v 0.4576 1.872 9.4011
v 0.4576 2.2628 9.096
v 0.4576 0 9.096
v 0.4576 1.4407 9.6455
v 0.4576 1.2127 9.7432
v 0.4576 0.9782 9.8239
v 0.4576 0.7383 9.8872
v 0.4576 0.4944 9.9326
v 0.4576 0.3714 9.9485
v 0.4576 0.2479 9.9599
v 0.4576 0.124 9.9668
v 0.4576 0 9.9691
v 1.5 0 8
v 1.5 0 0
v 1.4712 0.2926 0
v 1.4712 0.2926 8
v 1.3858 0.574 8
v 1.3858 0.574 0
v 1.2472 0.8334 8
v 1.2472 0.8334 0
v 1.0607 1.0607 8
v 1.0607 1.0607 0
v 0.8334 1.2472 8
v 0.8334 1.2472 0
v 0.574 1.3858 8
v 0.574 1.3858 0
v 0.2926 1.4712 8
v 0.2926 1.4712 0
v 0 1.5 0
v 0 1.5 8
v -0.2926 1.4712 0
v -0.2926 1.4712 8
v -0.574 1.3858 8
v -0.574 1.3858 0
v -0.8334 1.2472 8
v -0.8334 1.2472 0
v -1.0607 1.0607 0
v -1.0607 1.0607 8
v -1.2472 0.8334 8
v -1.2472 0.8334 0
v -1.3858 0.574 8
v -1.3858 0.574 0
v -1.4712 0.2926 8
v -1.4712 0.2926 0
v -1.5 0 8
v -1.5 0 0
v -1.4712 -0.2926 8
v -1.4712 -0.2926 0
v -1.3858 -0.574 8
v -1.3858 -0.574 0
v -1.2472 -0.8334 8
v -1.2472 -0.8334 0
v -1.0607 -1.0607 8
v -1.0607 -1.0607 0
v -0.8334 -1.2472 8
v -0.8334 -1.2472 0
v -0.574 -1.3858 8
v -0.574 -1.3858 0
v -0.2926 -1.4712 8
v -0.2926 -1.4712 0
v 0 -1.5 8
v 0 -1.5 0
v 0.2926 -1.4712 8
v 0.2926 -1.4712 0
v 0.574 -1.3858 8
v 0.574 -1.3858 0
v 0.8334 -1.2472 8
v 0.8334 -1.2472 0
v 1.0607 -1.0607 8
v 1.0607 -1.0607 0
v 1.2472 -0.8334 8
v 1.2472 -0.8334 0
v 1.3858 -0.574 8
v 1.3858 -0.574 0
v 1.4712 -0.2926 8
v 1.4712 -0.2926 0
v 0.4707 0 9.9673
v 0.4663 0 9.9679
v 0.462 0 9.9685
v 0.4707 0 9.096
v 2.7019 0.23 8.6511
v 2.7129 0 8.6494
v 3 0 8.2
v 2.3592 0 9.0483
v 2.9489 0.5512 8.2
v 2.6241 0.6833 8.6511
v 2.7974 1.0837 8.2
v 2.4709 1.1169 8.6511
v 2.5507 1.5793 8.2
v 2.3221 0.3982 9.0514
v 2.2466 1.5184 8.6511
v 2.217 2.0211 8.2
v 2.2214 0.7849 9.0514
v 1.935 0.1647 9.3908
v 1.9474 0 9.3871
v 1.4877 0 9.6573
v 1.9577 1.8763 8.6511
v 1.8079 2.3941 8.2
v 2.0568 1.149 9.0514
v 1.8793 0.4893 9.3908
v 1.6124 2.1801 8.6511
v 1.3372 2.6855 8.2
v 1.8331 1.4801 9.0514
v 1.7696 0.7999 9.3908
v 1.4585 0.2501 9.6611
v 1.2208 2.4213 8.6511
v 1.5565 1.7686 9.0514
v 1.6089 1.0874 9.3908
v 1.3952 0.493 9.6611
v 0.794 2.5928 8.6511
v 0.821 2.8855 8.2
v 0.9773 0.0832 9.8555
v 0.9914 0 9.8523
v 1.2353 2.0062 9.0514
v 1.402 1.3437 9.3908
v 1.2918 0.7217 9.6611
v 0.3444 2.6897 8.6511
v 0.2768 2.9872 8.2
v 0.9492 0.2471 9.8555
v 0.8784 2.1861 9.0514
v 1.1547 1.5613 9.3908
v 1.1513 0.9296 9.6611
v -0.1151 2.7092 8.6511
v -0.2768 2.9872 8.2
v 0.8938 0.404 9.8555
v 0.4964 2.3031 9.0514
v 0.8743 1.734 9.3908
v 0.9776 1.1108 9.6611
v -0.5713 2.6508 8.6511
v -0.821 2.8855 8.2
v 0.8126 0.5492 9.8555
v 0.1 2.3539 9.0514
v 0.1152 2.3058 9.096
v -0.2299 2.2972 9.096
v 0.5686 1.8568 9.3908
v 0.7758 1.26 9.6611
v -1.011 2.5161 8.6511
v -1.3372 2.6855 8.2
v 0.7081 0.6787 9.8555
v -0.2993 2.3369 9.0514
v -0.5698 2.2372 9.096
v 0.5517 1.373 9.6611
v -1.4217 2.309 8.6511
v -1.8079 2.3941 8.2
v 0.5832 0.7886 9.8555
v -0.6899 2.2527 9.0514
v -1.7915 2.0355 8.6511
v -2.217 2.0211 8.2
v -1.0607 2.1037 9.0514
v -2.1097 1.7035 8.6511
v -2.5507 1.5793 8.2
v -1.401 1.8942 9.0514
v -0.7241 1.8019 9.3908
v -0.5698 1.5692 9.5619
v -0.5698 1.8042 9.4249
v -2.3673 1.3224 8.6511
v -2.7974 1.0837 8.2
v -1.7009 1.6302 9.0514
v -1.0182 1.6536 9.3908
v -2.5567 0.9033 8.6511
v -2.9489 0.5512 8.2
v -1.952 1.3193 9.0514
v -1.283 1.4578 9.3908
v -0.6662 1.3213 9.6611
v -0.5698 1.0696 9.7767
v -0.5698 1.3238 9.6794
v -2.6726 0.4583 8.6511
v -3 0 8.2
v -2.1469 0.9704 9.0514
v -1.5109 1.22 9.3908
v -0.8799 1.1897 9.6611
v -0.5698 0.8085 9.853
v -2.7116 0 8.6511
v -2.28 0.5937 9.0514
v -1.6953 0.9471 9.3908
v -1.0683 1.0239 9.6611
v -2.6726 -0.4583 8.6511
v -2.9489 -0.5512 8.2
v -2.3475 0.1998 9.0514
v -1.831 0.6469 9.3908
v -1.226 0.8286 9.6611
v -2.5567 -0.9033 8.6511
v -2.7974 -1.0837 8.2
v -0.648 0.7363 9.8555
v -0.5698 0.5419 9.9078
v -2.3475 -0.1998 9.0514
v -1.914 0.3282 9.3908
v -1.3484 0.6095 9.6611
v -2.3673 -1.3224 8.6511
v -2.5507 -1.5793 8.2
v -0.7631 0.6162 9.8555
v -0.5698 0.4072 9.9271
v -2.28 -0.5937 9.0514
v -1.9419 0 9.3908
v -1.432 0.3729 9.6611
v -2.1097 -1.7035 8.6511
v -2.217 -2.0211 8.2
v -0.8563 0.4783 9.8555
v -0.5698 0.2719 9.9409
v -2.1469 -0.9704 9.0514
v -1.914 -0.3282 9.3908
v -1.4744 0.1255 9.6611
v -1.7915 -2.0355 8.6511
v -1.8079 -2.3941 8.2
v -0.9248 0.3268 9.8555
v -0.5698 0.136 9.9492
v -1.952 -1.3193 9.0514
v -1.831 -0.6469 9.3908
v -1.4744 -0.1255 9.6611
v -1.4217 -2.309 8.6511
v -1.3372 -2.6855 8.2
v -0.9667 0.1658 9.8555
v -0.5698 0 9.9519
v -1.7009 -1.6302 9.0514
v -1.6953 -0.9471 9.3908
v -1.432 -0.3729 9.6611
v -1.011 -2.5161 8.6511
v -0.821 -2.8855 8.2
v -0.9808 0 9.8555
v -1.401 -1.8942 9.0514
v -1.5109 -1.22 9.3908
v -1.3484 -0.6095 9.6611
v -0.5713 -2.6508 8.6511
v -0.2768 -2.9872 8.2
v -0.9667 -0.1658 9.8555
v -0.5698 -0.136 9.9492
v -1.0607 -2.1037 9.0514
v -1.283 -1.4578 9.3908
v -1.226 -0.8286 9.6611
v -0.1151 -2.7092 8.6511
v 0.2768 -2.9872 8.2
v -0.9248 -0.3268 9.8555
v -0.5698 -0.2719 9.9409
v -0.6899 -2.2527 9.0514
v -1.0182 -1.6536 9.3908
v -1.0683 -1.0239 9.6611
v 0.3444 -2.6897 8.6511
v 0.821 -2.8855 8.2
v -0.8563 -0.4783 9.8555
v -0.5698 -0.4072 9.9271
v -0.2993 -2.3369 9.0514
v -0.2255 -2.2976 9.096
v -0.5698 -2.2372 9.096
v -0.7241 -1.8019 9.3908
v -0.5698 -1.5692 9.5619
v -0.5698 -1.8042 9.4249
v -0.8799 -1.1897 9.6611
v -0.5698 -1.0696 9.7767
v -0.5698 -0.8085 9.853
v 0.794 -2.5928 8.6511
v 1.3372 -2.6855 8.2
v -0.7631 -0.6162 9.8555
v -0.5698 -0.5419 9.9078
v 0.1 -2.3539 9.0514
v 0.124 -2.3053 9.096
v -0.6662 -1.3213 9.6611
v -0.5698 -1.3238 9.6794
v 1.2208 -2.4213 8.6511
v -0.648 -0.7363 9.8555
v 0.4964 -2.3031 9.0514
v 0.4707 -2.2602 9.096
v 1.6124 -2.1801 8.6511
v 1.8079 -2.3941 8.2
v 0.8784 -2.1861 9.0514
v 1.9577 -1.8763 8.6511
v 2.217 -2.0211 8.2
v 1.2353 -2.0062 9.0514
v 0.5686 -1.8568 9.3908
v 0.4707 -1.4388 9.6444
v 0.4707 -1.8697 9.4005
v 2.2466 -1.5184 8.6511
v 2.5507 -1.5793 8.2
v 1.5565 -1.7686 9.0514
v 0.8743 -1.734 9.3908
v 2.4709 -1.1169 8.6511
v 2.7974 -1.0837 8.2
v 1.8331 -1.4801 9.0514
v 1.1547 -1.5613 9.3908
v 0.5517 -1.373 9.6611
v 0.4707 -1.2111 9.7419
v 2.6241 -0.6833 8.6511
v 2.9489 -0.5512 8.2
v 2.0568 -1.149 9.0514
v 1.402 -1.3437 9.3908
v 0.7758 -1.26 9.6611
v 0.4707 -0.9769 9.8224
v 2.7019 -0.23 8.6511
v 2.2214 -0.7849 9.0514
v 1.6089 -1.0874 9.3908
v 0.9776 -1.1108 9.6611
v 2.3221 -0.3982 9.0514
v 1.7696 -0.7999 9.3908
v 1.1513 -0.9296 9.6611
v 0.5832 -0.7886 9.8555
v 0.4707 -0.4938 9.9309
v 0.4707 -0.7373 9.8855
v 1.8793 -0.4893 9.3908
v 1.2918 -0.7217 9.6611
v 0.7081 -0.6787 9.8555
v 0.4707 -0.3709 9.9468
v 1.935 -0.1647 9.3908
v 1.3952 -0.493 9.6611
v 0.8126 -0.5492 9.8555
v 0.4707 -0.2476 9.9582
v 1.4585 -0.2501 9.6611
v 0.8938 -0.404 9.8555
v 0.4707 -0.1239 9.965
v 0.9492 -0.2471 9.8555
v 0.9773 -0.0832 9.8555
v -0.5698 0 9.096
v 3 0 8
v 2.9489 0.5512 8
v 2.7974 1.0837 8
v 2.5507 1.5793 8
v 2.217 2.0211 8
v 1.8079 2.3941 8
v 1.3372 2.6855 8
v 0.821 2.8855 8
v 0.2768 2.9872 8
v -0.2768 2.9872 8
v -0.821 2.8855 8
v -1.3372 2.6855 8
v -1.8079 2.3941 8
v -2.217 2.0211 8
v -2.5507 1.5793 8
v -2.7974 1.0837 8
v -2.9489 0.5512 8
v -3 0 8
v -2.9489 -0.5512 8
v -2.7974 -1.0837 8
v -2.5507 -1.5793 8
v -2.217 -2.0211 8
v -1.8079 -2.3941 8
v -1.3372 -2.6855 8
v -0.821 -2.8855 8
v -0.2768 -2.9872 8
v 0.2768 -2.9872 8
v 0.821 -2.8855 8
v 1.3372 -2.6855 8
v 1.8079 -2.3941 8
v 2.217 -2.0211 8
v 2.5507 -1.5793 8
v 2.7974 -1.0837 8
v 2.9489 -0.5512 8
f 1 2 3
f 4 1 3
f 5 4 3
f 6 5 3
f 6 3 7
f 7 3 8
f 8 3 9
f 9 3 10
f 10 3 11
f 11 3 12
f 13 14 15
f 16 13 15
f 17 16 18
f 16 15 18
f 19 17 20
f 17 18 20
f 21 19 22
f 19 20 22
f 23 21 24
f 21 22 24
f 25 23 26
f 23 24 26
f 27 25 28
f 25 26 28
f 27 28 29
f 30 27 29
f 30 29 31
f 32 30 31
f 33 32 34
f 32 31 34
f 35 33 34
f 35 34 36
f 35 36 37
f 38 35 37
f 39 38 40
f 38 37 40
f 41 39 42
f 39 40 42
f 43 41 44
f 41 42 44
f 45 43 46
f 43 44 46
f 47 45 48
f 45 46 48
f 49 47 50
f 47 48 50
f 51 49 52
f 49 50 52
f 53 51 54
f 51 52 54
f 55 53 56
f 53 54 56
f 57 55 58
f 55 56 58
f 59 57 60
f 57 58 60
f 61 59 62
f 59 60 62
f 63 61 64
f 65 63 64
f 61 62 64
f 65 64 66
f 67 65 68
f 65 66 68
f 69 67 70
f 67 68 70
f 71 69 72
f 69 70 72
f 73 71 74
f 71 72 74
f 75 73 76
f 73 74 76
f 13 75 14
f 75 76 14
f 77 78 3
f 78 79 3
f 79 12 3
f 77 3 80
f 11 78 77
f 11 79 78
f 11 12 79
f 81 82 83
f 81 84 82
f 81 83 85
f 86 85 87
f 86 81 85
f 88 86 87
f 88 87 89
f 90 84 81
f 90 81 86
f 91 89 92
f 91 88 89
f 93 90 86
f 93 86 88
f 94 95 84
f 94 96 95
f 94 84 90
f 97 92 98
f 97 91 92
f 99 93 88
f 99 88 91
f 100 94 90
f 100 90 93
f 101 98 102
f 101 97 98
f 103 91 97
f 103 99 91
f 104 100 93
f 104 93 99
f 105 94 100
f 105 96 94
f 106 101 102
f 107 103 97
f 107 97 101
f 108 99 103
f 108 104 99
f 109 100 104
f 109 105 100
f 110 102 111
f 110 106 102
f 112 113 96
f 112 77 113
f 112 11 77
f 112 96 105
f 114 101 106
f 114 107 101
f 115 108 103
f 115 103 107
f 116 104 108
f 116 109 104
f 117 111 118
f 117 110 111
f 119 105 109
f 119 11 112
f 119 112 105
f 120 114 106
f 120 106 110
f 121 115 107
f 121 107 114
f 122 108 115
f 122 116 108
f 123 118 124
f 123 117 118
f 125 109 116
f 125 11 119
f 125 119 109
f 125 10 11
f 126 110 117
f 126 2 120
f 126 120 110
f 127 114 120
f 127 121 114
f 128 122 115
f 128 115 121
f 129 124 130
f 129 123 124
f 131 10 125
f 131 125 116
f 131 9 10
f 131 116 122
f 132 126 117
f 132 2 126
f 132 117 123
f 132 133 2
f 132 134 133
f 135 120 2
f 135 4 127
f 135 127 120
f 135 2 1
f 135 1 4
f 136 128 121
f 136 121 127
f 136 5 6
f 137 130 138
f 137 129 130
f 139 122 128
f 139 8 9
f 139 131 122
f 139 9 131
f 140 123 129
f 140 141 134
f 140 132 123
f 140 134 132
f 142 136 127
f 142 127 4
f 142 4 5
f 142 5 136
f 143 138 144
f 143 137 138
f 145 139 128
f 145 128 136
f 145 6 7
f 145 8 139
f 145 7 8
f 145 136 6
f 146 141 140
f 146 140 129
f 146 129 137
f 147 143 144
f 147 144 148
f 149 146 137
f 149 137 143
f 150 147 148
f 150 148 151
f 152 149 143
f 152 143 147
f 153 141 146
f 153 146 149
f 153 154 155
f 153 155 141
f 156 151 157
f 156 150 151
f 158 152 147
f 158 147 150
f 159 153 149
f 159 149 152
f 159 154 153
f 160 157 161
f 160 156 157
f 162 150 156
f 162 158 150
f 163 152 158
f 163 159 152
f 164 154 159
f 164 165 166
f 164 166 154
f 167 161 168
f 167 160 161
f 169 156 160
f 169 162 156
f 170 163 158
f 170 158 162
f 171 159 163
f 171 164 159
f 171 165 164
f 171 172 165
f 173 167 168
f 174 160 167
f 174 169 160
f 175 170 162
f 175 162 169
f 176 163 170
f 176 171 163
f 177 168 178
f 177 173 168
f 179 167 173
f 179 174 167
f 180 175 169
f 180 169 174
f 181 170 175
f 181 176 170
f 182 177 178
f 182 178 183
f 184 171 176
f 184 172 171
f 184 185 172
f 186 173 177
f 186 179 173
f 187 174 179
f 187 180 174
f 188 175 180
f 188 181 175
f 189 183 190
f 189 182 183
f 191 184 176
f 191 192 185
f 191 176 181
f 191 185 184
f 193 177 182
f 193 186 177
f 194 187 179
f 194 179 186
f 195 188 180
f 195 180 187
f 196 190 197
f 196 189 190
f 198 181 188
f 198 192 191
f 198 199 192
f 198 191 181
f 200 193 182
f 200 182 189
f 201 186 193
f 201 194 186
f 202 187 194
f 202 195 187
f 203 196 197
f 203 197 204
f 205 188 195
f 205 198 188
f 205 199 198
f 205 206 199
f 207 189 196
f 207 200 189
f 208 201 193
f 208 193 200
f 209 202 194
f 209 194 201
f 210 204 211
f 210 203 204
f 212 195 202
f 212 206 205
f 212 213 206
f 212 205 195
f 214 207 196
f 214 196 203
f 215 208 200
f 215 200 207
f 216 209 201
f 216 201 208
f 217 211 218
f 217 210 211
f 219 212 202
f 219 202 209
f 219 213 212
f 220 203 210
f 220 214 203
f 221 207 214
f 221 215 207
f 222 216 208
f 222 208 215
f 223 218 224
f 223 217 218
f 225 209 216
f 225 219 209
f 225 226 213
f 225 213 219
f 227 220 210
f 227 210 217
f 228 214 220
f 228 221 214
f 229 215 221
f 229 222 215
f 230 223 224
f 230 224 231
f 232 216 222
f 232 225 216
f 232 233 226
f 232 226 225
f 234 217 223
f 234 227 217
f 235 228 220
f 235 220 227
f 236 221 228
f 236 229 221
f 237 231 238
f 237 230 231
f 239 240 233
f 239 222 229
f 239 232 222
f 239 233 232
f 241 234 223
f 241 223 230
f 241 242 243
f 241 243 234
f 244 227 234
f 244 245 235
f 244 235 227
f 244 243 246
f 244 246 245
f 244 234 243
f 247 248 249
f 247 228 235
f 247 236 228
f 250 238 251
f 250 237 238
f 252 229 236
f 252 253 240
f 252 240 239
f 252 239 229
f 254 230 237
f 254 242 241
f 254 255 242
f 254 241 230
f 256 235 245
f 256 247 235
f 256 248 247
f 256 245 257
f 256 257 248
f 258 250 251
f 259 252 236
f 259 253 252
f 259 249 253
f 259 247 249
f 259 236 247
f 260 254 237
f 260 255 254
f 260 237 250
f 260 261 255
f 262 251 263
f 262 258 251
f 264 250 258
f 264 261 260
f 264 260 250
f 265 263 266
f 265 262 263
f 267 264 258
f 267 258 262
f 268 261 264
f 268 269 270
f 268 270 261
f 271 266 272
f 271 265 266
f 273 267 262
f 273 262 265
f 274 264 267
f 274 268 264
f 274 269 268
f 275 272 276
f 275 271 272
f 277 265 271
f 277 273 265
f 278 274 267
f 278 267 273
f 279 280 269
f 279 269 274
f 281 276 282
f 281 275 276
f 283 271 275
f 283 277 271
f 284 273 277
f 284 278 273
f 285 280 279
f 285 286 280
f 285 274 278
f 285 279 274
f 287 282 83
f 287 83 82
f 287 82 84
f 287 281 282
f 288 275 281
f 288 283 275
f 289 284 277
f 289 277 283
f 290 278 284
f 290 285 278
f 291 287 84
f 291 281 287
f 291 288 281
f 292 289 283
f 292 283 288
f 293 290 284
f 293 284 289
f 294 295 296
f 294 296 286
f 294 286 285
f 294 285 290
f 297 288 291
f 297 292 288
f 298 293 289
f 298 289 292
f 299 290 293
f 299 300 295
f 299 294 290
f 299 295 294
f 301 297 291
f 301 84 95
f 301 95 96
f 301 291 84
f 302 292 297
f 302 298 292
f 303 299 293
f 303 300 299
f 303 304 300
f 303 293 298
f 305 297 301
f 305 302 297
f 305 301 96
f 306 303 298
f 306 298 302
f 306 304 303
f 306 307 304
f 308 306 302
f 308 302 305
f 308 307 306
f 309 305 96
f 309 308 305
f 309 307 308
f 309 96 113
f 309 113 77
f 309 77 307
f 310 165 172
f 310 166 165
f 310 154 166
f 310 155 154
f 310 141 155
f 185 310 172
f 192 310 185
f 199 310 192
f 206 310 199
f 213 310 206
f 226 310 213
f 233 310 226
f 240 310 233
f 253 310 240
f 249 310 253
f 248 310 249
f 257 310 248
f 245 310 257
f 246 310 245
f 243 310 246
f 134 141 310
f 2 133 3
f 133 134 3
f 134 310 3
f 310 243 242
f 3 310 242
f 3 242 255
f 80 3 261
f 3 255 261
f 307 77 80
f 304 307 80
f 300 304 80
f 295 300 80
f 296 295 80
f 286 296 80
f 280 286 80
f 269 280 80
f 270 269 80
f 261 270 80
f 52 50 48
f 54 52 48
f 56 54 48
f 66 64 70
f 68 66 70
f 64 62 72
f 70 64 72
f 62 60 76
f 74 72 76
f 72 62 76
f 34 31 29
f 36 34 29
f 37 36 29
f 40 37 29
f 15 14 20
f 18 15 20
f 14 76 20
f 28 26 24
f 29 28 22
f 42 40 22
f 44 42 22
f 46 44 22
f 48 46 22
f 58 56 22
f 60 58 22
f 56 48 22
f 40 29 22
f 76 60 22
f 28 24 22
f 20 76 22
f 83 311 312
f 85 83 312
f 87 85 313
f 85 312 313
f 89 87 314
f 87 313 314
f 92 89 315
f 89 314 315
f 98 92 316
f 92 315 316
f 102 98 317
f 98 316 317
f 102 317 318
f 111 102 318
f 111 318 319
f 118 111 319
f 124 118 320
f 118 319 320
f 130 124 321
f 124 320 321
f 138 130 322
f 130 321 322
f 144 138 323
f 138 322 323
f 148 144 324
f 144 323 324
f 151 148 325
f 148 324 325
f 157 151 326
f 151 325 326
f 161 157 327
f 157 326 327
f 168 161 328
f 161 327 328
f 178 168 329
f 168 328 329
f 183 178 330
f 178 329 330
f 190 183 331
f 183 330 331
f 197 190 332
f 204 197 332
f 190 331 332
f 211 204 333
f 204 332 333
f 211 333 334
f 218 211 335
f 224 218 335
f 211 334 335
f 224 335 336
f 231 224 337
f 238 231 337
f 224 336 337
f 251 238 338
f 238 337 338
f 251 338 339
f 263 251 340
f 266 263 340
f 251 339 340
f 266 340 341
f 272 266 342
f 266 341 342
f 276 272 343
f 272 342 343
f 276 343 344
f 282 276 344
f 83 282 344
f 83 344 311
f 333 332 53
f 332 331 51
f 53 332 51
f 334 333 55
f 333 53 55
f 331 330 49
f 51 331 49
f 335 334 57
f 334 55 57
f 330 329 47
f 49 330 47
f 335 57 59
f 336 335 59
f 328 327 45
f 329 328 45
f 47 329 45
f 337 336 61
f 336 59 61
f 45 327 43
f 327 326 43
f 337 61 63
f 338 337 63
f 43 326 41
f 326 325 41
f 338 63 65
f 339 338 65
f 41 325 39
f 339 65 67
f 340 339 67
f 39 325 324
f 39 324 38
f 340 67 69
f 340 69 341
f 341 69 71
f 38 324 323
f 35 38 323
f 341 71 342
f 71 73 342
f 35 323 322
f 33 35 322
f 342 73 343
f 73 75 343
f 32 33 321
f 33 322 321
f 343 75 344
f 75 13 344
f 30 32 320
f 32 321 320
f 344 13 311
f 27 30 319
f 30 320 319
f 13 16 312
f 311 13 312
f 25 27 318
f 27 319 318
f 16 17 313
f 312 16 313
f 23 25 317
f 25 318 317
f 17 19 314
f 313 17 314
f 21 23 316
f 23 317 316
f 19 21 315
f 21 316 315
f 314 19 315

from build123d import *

# Parameters (mm, degrees)
SKETCH_1_R          = 1.5
EXTRUDE_1_DEPTH     = 8
SKETCH_2_R          = 3
EXTRUDE_2_DEPTH     = 0.2
DOME_1_FACE_RADIUS  = 3
DOME_1_HEIGHT       = 1.8
SKETCH_4_W          = 1.040451318
SKETCH_4_H          = 2.30386654
CUT_EXTRUDE_3_DEPTH = 50
SKETCH_7_W          = 1.027378529
SKETCH_7_H          = 1.803274818
CUT_EXTRUDE_6_DEPTH = 50


with BuildPart() as part:
    # Эскиз1 → Вытянуть1 (new body)
    with BuildSketch(Plane.XY):
        Circle(SKETCH_1_R)
    extrude(amount=EXTRUDE_1_DEPTH)

    # Эскиз2 → Вытянуть2 (add)
    with BuildSketch(Plane.XY.offset(8)):
        Circle(SKETCH_2_R)
    extrude(amount=EXTRUDE_2_DEPTH)

    # Купол1: a dome of height H over a round flat face of radius A is a cap of a sphere of radius (A * A + H * H) / (2 * H)
    dome_1_r = (DOME_1_FACE_RADIUS * DOME_1_FACE_RADIUS + DOME_1_HEIGHT * DOME_1_HEIGHT) / (2 * DOME_1_HEIGHT)
    dome_1_base = Plane((0, 0, 8.2), z_dir=(0, 0, 1))
    with Locations(dome_1_base.offset(DOME_1_HEIGHT - dome_1_r)):
        dome_1_ball = Sphere(dome_1_r, mode=Mode.PRIVATE)
    add(split(dome_1_ball, bisect_by=dome_1_base, keep=Keep.TOP, mode=Mode.PRIVATE))

    # Эскиз4 → Вырез-Вытянуть3 (cut)
    with BuildSketch(Plane(origin=(0, 0, 0), x_dir=(1, 0, 0), z_dir=(0, 1, 0))):
        with Locations((-0.049545301, -10.24795251)):
            Rectangle(SKETCH_4_W, SKETCH_4_H)
    extrude(amount=-CUT_EXTRUDE_3_DEPTH, mode=Mode.SUBTRACT)

    # Эскиз7 → Вырез-Вытянуть6 (cut)
    with BuildSketch(Plane.XZ):
        with Locations((-0.056081696, 9.997656649)):
            Rectangle(SKETCH_7_W, SKETCH_7_H)
    extrude(amount=-CUT_EXTRUDE_6_DEPTH, mode=Mode.SUBTRACT)


solid = part.part
